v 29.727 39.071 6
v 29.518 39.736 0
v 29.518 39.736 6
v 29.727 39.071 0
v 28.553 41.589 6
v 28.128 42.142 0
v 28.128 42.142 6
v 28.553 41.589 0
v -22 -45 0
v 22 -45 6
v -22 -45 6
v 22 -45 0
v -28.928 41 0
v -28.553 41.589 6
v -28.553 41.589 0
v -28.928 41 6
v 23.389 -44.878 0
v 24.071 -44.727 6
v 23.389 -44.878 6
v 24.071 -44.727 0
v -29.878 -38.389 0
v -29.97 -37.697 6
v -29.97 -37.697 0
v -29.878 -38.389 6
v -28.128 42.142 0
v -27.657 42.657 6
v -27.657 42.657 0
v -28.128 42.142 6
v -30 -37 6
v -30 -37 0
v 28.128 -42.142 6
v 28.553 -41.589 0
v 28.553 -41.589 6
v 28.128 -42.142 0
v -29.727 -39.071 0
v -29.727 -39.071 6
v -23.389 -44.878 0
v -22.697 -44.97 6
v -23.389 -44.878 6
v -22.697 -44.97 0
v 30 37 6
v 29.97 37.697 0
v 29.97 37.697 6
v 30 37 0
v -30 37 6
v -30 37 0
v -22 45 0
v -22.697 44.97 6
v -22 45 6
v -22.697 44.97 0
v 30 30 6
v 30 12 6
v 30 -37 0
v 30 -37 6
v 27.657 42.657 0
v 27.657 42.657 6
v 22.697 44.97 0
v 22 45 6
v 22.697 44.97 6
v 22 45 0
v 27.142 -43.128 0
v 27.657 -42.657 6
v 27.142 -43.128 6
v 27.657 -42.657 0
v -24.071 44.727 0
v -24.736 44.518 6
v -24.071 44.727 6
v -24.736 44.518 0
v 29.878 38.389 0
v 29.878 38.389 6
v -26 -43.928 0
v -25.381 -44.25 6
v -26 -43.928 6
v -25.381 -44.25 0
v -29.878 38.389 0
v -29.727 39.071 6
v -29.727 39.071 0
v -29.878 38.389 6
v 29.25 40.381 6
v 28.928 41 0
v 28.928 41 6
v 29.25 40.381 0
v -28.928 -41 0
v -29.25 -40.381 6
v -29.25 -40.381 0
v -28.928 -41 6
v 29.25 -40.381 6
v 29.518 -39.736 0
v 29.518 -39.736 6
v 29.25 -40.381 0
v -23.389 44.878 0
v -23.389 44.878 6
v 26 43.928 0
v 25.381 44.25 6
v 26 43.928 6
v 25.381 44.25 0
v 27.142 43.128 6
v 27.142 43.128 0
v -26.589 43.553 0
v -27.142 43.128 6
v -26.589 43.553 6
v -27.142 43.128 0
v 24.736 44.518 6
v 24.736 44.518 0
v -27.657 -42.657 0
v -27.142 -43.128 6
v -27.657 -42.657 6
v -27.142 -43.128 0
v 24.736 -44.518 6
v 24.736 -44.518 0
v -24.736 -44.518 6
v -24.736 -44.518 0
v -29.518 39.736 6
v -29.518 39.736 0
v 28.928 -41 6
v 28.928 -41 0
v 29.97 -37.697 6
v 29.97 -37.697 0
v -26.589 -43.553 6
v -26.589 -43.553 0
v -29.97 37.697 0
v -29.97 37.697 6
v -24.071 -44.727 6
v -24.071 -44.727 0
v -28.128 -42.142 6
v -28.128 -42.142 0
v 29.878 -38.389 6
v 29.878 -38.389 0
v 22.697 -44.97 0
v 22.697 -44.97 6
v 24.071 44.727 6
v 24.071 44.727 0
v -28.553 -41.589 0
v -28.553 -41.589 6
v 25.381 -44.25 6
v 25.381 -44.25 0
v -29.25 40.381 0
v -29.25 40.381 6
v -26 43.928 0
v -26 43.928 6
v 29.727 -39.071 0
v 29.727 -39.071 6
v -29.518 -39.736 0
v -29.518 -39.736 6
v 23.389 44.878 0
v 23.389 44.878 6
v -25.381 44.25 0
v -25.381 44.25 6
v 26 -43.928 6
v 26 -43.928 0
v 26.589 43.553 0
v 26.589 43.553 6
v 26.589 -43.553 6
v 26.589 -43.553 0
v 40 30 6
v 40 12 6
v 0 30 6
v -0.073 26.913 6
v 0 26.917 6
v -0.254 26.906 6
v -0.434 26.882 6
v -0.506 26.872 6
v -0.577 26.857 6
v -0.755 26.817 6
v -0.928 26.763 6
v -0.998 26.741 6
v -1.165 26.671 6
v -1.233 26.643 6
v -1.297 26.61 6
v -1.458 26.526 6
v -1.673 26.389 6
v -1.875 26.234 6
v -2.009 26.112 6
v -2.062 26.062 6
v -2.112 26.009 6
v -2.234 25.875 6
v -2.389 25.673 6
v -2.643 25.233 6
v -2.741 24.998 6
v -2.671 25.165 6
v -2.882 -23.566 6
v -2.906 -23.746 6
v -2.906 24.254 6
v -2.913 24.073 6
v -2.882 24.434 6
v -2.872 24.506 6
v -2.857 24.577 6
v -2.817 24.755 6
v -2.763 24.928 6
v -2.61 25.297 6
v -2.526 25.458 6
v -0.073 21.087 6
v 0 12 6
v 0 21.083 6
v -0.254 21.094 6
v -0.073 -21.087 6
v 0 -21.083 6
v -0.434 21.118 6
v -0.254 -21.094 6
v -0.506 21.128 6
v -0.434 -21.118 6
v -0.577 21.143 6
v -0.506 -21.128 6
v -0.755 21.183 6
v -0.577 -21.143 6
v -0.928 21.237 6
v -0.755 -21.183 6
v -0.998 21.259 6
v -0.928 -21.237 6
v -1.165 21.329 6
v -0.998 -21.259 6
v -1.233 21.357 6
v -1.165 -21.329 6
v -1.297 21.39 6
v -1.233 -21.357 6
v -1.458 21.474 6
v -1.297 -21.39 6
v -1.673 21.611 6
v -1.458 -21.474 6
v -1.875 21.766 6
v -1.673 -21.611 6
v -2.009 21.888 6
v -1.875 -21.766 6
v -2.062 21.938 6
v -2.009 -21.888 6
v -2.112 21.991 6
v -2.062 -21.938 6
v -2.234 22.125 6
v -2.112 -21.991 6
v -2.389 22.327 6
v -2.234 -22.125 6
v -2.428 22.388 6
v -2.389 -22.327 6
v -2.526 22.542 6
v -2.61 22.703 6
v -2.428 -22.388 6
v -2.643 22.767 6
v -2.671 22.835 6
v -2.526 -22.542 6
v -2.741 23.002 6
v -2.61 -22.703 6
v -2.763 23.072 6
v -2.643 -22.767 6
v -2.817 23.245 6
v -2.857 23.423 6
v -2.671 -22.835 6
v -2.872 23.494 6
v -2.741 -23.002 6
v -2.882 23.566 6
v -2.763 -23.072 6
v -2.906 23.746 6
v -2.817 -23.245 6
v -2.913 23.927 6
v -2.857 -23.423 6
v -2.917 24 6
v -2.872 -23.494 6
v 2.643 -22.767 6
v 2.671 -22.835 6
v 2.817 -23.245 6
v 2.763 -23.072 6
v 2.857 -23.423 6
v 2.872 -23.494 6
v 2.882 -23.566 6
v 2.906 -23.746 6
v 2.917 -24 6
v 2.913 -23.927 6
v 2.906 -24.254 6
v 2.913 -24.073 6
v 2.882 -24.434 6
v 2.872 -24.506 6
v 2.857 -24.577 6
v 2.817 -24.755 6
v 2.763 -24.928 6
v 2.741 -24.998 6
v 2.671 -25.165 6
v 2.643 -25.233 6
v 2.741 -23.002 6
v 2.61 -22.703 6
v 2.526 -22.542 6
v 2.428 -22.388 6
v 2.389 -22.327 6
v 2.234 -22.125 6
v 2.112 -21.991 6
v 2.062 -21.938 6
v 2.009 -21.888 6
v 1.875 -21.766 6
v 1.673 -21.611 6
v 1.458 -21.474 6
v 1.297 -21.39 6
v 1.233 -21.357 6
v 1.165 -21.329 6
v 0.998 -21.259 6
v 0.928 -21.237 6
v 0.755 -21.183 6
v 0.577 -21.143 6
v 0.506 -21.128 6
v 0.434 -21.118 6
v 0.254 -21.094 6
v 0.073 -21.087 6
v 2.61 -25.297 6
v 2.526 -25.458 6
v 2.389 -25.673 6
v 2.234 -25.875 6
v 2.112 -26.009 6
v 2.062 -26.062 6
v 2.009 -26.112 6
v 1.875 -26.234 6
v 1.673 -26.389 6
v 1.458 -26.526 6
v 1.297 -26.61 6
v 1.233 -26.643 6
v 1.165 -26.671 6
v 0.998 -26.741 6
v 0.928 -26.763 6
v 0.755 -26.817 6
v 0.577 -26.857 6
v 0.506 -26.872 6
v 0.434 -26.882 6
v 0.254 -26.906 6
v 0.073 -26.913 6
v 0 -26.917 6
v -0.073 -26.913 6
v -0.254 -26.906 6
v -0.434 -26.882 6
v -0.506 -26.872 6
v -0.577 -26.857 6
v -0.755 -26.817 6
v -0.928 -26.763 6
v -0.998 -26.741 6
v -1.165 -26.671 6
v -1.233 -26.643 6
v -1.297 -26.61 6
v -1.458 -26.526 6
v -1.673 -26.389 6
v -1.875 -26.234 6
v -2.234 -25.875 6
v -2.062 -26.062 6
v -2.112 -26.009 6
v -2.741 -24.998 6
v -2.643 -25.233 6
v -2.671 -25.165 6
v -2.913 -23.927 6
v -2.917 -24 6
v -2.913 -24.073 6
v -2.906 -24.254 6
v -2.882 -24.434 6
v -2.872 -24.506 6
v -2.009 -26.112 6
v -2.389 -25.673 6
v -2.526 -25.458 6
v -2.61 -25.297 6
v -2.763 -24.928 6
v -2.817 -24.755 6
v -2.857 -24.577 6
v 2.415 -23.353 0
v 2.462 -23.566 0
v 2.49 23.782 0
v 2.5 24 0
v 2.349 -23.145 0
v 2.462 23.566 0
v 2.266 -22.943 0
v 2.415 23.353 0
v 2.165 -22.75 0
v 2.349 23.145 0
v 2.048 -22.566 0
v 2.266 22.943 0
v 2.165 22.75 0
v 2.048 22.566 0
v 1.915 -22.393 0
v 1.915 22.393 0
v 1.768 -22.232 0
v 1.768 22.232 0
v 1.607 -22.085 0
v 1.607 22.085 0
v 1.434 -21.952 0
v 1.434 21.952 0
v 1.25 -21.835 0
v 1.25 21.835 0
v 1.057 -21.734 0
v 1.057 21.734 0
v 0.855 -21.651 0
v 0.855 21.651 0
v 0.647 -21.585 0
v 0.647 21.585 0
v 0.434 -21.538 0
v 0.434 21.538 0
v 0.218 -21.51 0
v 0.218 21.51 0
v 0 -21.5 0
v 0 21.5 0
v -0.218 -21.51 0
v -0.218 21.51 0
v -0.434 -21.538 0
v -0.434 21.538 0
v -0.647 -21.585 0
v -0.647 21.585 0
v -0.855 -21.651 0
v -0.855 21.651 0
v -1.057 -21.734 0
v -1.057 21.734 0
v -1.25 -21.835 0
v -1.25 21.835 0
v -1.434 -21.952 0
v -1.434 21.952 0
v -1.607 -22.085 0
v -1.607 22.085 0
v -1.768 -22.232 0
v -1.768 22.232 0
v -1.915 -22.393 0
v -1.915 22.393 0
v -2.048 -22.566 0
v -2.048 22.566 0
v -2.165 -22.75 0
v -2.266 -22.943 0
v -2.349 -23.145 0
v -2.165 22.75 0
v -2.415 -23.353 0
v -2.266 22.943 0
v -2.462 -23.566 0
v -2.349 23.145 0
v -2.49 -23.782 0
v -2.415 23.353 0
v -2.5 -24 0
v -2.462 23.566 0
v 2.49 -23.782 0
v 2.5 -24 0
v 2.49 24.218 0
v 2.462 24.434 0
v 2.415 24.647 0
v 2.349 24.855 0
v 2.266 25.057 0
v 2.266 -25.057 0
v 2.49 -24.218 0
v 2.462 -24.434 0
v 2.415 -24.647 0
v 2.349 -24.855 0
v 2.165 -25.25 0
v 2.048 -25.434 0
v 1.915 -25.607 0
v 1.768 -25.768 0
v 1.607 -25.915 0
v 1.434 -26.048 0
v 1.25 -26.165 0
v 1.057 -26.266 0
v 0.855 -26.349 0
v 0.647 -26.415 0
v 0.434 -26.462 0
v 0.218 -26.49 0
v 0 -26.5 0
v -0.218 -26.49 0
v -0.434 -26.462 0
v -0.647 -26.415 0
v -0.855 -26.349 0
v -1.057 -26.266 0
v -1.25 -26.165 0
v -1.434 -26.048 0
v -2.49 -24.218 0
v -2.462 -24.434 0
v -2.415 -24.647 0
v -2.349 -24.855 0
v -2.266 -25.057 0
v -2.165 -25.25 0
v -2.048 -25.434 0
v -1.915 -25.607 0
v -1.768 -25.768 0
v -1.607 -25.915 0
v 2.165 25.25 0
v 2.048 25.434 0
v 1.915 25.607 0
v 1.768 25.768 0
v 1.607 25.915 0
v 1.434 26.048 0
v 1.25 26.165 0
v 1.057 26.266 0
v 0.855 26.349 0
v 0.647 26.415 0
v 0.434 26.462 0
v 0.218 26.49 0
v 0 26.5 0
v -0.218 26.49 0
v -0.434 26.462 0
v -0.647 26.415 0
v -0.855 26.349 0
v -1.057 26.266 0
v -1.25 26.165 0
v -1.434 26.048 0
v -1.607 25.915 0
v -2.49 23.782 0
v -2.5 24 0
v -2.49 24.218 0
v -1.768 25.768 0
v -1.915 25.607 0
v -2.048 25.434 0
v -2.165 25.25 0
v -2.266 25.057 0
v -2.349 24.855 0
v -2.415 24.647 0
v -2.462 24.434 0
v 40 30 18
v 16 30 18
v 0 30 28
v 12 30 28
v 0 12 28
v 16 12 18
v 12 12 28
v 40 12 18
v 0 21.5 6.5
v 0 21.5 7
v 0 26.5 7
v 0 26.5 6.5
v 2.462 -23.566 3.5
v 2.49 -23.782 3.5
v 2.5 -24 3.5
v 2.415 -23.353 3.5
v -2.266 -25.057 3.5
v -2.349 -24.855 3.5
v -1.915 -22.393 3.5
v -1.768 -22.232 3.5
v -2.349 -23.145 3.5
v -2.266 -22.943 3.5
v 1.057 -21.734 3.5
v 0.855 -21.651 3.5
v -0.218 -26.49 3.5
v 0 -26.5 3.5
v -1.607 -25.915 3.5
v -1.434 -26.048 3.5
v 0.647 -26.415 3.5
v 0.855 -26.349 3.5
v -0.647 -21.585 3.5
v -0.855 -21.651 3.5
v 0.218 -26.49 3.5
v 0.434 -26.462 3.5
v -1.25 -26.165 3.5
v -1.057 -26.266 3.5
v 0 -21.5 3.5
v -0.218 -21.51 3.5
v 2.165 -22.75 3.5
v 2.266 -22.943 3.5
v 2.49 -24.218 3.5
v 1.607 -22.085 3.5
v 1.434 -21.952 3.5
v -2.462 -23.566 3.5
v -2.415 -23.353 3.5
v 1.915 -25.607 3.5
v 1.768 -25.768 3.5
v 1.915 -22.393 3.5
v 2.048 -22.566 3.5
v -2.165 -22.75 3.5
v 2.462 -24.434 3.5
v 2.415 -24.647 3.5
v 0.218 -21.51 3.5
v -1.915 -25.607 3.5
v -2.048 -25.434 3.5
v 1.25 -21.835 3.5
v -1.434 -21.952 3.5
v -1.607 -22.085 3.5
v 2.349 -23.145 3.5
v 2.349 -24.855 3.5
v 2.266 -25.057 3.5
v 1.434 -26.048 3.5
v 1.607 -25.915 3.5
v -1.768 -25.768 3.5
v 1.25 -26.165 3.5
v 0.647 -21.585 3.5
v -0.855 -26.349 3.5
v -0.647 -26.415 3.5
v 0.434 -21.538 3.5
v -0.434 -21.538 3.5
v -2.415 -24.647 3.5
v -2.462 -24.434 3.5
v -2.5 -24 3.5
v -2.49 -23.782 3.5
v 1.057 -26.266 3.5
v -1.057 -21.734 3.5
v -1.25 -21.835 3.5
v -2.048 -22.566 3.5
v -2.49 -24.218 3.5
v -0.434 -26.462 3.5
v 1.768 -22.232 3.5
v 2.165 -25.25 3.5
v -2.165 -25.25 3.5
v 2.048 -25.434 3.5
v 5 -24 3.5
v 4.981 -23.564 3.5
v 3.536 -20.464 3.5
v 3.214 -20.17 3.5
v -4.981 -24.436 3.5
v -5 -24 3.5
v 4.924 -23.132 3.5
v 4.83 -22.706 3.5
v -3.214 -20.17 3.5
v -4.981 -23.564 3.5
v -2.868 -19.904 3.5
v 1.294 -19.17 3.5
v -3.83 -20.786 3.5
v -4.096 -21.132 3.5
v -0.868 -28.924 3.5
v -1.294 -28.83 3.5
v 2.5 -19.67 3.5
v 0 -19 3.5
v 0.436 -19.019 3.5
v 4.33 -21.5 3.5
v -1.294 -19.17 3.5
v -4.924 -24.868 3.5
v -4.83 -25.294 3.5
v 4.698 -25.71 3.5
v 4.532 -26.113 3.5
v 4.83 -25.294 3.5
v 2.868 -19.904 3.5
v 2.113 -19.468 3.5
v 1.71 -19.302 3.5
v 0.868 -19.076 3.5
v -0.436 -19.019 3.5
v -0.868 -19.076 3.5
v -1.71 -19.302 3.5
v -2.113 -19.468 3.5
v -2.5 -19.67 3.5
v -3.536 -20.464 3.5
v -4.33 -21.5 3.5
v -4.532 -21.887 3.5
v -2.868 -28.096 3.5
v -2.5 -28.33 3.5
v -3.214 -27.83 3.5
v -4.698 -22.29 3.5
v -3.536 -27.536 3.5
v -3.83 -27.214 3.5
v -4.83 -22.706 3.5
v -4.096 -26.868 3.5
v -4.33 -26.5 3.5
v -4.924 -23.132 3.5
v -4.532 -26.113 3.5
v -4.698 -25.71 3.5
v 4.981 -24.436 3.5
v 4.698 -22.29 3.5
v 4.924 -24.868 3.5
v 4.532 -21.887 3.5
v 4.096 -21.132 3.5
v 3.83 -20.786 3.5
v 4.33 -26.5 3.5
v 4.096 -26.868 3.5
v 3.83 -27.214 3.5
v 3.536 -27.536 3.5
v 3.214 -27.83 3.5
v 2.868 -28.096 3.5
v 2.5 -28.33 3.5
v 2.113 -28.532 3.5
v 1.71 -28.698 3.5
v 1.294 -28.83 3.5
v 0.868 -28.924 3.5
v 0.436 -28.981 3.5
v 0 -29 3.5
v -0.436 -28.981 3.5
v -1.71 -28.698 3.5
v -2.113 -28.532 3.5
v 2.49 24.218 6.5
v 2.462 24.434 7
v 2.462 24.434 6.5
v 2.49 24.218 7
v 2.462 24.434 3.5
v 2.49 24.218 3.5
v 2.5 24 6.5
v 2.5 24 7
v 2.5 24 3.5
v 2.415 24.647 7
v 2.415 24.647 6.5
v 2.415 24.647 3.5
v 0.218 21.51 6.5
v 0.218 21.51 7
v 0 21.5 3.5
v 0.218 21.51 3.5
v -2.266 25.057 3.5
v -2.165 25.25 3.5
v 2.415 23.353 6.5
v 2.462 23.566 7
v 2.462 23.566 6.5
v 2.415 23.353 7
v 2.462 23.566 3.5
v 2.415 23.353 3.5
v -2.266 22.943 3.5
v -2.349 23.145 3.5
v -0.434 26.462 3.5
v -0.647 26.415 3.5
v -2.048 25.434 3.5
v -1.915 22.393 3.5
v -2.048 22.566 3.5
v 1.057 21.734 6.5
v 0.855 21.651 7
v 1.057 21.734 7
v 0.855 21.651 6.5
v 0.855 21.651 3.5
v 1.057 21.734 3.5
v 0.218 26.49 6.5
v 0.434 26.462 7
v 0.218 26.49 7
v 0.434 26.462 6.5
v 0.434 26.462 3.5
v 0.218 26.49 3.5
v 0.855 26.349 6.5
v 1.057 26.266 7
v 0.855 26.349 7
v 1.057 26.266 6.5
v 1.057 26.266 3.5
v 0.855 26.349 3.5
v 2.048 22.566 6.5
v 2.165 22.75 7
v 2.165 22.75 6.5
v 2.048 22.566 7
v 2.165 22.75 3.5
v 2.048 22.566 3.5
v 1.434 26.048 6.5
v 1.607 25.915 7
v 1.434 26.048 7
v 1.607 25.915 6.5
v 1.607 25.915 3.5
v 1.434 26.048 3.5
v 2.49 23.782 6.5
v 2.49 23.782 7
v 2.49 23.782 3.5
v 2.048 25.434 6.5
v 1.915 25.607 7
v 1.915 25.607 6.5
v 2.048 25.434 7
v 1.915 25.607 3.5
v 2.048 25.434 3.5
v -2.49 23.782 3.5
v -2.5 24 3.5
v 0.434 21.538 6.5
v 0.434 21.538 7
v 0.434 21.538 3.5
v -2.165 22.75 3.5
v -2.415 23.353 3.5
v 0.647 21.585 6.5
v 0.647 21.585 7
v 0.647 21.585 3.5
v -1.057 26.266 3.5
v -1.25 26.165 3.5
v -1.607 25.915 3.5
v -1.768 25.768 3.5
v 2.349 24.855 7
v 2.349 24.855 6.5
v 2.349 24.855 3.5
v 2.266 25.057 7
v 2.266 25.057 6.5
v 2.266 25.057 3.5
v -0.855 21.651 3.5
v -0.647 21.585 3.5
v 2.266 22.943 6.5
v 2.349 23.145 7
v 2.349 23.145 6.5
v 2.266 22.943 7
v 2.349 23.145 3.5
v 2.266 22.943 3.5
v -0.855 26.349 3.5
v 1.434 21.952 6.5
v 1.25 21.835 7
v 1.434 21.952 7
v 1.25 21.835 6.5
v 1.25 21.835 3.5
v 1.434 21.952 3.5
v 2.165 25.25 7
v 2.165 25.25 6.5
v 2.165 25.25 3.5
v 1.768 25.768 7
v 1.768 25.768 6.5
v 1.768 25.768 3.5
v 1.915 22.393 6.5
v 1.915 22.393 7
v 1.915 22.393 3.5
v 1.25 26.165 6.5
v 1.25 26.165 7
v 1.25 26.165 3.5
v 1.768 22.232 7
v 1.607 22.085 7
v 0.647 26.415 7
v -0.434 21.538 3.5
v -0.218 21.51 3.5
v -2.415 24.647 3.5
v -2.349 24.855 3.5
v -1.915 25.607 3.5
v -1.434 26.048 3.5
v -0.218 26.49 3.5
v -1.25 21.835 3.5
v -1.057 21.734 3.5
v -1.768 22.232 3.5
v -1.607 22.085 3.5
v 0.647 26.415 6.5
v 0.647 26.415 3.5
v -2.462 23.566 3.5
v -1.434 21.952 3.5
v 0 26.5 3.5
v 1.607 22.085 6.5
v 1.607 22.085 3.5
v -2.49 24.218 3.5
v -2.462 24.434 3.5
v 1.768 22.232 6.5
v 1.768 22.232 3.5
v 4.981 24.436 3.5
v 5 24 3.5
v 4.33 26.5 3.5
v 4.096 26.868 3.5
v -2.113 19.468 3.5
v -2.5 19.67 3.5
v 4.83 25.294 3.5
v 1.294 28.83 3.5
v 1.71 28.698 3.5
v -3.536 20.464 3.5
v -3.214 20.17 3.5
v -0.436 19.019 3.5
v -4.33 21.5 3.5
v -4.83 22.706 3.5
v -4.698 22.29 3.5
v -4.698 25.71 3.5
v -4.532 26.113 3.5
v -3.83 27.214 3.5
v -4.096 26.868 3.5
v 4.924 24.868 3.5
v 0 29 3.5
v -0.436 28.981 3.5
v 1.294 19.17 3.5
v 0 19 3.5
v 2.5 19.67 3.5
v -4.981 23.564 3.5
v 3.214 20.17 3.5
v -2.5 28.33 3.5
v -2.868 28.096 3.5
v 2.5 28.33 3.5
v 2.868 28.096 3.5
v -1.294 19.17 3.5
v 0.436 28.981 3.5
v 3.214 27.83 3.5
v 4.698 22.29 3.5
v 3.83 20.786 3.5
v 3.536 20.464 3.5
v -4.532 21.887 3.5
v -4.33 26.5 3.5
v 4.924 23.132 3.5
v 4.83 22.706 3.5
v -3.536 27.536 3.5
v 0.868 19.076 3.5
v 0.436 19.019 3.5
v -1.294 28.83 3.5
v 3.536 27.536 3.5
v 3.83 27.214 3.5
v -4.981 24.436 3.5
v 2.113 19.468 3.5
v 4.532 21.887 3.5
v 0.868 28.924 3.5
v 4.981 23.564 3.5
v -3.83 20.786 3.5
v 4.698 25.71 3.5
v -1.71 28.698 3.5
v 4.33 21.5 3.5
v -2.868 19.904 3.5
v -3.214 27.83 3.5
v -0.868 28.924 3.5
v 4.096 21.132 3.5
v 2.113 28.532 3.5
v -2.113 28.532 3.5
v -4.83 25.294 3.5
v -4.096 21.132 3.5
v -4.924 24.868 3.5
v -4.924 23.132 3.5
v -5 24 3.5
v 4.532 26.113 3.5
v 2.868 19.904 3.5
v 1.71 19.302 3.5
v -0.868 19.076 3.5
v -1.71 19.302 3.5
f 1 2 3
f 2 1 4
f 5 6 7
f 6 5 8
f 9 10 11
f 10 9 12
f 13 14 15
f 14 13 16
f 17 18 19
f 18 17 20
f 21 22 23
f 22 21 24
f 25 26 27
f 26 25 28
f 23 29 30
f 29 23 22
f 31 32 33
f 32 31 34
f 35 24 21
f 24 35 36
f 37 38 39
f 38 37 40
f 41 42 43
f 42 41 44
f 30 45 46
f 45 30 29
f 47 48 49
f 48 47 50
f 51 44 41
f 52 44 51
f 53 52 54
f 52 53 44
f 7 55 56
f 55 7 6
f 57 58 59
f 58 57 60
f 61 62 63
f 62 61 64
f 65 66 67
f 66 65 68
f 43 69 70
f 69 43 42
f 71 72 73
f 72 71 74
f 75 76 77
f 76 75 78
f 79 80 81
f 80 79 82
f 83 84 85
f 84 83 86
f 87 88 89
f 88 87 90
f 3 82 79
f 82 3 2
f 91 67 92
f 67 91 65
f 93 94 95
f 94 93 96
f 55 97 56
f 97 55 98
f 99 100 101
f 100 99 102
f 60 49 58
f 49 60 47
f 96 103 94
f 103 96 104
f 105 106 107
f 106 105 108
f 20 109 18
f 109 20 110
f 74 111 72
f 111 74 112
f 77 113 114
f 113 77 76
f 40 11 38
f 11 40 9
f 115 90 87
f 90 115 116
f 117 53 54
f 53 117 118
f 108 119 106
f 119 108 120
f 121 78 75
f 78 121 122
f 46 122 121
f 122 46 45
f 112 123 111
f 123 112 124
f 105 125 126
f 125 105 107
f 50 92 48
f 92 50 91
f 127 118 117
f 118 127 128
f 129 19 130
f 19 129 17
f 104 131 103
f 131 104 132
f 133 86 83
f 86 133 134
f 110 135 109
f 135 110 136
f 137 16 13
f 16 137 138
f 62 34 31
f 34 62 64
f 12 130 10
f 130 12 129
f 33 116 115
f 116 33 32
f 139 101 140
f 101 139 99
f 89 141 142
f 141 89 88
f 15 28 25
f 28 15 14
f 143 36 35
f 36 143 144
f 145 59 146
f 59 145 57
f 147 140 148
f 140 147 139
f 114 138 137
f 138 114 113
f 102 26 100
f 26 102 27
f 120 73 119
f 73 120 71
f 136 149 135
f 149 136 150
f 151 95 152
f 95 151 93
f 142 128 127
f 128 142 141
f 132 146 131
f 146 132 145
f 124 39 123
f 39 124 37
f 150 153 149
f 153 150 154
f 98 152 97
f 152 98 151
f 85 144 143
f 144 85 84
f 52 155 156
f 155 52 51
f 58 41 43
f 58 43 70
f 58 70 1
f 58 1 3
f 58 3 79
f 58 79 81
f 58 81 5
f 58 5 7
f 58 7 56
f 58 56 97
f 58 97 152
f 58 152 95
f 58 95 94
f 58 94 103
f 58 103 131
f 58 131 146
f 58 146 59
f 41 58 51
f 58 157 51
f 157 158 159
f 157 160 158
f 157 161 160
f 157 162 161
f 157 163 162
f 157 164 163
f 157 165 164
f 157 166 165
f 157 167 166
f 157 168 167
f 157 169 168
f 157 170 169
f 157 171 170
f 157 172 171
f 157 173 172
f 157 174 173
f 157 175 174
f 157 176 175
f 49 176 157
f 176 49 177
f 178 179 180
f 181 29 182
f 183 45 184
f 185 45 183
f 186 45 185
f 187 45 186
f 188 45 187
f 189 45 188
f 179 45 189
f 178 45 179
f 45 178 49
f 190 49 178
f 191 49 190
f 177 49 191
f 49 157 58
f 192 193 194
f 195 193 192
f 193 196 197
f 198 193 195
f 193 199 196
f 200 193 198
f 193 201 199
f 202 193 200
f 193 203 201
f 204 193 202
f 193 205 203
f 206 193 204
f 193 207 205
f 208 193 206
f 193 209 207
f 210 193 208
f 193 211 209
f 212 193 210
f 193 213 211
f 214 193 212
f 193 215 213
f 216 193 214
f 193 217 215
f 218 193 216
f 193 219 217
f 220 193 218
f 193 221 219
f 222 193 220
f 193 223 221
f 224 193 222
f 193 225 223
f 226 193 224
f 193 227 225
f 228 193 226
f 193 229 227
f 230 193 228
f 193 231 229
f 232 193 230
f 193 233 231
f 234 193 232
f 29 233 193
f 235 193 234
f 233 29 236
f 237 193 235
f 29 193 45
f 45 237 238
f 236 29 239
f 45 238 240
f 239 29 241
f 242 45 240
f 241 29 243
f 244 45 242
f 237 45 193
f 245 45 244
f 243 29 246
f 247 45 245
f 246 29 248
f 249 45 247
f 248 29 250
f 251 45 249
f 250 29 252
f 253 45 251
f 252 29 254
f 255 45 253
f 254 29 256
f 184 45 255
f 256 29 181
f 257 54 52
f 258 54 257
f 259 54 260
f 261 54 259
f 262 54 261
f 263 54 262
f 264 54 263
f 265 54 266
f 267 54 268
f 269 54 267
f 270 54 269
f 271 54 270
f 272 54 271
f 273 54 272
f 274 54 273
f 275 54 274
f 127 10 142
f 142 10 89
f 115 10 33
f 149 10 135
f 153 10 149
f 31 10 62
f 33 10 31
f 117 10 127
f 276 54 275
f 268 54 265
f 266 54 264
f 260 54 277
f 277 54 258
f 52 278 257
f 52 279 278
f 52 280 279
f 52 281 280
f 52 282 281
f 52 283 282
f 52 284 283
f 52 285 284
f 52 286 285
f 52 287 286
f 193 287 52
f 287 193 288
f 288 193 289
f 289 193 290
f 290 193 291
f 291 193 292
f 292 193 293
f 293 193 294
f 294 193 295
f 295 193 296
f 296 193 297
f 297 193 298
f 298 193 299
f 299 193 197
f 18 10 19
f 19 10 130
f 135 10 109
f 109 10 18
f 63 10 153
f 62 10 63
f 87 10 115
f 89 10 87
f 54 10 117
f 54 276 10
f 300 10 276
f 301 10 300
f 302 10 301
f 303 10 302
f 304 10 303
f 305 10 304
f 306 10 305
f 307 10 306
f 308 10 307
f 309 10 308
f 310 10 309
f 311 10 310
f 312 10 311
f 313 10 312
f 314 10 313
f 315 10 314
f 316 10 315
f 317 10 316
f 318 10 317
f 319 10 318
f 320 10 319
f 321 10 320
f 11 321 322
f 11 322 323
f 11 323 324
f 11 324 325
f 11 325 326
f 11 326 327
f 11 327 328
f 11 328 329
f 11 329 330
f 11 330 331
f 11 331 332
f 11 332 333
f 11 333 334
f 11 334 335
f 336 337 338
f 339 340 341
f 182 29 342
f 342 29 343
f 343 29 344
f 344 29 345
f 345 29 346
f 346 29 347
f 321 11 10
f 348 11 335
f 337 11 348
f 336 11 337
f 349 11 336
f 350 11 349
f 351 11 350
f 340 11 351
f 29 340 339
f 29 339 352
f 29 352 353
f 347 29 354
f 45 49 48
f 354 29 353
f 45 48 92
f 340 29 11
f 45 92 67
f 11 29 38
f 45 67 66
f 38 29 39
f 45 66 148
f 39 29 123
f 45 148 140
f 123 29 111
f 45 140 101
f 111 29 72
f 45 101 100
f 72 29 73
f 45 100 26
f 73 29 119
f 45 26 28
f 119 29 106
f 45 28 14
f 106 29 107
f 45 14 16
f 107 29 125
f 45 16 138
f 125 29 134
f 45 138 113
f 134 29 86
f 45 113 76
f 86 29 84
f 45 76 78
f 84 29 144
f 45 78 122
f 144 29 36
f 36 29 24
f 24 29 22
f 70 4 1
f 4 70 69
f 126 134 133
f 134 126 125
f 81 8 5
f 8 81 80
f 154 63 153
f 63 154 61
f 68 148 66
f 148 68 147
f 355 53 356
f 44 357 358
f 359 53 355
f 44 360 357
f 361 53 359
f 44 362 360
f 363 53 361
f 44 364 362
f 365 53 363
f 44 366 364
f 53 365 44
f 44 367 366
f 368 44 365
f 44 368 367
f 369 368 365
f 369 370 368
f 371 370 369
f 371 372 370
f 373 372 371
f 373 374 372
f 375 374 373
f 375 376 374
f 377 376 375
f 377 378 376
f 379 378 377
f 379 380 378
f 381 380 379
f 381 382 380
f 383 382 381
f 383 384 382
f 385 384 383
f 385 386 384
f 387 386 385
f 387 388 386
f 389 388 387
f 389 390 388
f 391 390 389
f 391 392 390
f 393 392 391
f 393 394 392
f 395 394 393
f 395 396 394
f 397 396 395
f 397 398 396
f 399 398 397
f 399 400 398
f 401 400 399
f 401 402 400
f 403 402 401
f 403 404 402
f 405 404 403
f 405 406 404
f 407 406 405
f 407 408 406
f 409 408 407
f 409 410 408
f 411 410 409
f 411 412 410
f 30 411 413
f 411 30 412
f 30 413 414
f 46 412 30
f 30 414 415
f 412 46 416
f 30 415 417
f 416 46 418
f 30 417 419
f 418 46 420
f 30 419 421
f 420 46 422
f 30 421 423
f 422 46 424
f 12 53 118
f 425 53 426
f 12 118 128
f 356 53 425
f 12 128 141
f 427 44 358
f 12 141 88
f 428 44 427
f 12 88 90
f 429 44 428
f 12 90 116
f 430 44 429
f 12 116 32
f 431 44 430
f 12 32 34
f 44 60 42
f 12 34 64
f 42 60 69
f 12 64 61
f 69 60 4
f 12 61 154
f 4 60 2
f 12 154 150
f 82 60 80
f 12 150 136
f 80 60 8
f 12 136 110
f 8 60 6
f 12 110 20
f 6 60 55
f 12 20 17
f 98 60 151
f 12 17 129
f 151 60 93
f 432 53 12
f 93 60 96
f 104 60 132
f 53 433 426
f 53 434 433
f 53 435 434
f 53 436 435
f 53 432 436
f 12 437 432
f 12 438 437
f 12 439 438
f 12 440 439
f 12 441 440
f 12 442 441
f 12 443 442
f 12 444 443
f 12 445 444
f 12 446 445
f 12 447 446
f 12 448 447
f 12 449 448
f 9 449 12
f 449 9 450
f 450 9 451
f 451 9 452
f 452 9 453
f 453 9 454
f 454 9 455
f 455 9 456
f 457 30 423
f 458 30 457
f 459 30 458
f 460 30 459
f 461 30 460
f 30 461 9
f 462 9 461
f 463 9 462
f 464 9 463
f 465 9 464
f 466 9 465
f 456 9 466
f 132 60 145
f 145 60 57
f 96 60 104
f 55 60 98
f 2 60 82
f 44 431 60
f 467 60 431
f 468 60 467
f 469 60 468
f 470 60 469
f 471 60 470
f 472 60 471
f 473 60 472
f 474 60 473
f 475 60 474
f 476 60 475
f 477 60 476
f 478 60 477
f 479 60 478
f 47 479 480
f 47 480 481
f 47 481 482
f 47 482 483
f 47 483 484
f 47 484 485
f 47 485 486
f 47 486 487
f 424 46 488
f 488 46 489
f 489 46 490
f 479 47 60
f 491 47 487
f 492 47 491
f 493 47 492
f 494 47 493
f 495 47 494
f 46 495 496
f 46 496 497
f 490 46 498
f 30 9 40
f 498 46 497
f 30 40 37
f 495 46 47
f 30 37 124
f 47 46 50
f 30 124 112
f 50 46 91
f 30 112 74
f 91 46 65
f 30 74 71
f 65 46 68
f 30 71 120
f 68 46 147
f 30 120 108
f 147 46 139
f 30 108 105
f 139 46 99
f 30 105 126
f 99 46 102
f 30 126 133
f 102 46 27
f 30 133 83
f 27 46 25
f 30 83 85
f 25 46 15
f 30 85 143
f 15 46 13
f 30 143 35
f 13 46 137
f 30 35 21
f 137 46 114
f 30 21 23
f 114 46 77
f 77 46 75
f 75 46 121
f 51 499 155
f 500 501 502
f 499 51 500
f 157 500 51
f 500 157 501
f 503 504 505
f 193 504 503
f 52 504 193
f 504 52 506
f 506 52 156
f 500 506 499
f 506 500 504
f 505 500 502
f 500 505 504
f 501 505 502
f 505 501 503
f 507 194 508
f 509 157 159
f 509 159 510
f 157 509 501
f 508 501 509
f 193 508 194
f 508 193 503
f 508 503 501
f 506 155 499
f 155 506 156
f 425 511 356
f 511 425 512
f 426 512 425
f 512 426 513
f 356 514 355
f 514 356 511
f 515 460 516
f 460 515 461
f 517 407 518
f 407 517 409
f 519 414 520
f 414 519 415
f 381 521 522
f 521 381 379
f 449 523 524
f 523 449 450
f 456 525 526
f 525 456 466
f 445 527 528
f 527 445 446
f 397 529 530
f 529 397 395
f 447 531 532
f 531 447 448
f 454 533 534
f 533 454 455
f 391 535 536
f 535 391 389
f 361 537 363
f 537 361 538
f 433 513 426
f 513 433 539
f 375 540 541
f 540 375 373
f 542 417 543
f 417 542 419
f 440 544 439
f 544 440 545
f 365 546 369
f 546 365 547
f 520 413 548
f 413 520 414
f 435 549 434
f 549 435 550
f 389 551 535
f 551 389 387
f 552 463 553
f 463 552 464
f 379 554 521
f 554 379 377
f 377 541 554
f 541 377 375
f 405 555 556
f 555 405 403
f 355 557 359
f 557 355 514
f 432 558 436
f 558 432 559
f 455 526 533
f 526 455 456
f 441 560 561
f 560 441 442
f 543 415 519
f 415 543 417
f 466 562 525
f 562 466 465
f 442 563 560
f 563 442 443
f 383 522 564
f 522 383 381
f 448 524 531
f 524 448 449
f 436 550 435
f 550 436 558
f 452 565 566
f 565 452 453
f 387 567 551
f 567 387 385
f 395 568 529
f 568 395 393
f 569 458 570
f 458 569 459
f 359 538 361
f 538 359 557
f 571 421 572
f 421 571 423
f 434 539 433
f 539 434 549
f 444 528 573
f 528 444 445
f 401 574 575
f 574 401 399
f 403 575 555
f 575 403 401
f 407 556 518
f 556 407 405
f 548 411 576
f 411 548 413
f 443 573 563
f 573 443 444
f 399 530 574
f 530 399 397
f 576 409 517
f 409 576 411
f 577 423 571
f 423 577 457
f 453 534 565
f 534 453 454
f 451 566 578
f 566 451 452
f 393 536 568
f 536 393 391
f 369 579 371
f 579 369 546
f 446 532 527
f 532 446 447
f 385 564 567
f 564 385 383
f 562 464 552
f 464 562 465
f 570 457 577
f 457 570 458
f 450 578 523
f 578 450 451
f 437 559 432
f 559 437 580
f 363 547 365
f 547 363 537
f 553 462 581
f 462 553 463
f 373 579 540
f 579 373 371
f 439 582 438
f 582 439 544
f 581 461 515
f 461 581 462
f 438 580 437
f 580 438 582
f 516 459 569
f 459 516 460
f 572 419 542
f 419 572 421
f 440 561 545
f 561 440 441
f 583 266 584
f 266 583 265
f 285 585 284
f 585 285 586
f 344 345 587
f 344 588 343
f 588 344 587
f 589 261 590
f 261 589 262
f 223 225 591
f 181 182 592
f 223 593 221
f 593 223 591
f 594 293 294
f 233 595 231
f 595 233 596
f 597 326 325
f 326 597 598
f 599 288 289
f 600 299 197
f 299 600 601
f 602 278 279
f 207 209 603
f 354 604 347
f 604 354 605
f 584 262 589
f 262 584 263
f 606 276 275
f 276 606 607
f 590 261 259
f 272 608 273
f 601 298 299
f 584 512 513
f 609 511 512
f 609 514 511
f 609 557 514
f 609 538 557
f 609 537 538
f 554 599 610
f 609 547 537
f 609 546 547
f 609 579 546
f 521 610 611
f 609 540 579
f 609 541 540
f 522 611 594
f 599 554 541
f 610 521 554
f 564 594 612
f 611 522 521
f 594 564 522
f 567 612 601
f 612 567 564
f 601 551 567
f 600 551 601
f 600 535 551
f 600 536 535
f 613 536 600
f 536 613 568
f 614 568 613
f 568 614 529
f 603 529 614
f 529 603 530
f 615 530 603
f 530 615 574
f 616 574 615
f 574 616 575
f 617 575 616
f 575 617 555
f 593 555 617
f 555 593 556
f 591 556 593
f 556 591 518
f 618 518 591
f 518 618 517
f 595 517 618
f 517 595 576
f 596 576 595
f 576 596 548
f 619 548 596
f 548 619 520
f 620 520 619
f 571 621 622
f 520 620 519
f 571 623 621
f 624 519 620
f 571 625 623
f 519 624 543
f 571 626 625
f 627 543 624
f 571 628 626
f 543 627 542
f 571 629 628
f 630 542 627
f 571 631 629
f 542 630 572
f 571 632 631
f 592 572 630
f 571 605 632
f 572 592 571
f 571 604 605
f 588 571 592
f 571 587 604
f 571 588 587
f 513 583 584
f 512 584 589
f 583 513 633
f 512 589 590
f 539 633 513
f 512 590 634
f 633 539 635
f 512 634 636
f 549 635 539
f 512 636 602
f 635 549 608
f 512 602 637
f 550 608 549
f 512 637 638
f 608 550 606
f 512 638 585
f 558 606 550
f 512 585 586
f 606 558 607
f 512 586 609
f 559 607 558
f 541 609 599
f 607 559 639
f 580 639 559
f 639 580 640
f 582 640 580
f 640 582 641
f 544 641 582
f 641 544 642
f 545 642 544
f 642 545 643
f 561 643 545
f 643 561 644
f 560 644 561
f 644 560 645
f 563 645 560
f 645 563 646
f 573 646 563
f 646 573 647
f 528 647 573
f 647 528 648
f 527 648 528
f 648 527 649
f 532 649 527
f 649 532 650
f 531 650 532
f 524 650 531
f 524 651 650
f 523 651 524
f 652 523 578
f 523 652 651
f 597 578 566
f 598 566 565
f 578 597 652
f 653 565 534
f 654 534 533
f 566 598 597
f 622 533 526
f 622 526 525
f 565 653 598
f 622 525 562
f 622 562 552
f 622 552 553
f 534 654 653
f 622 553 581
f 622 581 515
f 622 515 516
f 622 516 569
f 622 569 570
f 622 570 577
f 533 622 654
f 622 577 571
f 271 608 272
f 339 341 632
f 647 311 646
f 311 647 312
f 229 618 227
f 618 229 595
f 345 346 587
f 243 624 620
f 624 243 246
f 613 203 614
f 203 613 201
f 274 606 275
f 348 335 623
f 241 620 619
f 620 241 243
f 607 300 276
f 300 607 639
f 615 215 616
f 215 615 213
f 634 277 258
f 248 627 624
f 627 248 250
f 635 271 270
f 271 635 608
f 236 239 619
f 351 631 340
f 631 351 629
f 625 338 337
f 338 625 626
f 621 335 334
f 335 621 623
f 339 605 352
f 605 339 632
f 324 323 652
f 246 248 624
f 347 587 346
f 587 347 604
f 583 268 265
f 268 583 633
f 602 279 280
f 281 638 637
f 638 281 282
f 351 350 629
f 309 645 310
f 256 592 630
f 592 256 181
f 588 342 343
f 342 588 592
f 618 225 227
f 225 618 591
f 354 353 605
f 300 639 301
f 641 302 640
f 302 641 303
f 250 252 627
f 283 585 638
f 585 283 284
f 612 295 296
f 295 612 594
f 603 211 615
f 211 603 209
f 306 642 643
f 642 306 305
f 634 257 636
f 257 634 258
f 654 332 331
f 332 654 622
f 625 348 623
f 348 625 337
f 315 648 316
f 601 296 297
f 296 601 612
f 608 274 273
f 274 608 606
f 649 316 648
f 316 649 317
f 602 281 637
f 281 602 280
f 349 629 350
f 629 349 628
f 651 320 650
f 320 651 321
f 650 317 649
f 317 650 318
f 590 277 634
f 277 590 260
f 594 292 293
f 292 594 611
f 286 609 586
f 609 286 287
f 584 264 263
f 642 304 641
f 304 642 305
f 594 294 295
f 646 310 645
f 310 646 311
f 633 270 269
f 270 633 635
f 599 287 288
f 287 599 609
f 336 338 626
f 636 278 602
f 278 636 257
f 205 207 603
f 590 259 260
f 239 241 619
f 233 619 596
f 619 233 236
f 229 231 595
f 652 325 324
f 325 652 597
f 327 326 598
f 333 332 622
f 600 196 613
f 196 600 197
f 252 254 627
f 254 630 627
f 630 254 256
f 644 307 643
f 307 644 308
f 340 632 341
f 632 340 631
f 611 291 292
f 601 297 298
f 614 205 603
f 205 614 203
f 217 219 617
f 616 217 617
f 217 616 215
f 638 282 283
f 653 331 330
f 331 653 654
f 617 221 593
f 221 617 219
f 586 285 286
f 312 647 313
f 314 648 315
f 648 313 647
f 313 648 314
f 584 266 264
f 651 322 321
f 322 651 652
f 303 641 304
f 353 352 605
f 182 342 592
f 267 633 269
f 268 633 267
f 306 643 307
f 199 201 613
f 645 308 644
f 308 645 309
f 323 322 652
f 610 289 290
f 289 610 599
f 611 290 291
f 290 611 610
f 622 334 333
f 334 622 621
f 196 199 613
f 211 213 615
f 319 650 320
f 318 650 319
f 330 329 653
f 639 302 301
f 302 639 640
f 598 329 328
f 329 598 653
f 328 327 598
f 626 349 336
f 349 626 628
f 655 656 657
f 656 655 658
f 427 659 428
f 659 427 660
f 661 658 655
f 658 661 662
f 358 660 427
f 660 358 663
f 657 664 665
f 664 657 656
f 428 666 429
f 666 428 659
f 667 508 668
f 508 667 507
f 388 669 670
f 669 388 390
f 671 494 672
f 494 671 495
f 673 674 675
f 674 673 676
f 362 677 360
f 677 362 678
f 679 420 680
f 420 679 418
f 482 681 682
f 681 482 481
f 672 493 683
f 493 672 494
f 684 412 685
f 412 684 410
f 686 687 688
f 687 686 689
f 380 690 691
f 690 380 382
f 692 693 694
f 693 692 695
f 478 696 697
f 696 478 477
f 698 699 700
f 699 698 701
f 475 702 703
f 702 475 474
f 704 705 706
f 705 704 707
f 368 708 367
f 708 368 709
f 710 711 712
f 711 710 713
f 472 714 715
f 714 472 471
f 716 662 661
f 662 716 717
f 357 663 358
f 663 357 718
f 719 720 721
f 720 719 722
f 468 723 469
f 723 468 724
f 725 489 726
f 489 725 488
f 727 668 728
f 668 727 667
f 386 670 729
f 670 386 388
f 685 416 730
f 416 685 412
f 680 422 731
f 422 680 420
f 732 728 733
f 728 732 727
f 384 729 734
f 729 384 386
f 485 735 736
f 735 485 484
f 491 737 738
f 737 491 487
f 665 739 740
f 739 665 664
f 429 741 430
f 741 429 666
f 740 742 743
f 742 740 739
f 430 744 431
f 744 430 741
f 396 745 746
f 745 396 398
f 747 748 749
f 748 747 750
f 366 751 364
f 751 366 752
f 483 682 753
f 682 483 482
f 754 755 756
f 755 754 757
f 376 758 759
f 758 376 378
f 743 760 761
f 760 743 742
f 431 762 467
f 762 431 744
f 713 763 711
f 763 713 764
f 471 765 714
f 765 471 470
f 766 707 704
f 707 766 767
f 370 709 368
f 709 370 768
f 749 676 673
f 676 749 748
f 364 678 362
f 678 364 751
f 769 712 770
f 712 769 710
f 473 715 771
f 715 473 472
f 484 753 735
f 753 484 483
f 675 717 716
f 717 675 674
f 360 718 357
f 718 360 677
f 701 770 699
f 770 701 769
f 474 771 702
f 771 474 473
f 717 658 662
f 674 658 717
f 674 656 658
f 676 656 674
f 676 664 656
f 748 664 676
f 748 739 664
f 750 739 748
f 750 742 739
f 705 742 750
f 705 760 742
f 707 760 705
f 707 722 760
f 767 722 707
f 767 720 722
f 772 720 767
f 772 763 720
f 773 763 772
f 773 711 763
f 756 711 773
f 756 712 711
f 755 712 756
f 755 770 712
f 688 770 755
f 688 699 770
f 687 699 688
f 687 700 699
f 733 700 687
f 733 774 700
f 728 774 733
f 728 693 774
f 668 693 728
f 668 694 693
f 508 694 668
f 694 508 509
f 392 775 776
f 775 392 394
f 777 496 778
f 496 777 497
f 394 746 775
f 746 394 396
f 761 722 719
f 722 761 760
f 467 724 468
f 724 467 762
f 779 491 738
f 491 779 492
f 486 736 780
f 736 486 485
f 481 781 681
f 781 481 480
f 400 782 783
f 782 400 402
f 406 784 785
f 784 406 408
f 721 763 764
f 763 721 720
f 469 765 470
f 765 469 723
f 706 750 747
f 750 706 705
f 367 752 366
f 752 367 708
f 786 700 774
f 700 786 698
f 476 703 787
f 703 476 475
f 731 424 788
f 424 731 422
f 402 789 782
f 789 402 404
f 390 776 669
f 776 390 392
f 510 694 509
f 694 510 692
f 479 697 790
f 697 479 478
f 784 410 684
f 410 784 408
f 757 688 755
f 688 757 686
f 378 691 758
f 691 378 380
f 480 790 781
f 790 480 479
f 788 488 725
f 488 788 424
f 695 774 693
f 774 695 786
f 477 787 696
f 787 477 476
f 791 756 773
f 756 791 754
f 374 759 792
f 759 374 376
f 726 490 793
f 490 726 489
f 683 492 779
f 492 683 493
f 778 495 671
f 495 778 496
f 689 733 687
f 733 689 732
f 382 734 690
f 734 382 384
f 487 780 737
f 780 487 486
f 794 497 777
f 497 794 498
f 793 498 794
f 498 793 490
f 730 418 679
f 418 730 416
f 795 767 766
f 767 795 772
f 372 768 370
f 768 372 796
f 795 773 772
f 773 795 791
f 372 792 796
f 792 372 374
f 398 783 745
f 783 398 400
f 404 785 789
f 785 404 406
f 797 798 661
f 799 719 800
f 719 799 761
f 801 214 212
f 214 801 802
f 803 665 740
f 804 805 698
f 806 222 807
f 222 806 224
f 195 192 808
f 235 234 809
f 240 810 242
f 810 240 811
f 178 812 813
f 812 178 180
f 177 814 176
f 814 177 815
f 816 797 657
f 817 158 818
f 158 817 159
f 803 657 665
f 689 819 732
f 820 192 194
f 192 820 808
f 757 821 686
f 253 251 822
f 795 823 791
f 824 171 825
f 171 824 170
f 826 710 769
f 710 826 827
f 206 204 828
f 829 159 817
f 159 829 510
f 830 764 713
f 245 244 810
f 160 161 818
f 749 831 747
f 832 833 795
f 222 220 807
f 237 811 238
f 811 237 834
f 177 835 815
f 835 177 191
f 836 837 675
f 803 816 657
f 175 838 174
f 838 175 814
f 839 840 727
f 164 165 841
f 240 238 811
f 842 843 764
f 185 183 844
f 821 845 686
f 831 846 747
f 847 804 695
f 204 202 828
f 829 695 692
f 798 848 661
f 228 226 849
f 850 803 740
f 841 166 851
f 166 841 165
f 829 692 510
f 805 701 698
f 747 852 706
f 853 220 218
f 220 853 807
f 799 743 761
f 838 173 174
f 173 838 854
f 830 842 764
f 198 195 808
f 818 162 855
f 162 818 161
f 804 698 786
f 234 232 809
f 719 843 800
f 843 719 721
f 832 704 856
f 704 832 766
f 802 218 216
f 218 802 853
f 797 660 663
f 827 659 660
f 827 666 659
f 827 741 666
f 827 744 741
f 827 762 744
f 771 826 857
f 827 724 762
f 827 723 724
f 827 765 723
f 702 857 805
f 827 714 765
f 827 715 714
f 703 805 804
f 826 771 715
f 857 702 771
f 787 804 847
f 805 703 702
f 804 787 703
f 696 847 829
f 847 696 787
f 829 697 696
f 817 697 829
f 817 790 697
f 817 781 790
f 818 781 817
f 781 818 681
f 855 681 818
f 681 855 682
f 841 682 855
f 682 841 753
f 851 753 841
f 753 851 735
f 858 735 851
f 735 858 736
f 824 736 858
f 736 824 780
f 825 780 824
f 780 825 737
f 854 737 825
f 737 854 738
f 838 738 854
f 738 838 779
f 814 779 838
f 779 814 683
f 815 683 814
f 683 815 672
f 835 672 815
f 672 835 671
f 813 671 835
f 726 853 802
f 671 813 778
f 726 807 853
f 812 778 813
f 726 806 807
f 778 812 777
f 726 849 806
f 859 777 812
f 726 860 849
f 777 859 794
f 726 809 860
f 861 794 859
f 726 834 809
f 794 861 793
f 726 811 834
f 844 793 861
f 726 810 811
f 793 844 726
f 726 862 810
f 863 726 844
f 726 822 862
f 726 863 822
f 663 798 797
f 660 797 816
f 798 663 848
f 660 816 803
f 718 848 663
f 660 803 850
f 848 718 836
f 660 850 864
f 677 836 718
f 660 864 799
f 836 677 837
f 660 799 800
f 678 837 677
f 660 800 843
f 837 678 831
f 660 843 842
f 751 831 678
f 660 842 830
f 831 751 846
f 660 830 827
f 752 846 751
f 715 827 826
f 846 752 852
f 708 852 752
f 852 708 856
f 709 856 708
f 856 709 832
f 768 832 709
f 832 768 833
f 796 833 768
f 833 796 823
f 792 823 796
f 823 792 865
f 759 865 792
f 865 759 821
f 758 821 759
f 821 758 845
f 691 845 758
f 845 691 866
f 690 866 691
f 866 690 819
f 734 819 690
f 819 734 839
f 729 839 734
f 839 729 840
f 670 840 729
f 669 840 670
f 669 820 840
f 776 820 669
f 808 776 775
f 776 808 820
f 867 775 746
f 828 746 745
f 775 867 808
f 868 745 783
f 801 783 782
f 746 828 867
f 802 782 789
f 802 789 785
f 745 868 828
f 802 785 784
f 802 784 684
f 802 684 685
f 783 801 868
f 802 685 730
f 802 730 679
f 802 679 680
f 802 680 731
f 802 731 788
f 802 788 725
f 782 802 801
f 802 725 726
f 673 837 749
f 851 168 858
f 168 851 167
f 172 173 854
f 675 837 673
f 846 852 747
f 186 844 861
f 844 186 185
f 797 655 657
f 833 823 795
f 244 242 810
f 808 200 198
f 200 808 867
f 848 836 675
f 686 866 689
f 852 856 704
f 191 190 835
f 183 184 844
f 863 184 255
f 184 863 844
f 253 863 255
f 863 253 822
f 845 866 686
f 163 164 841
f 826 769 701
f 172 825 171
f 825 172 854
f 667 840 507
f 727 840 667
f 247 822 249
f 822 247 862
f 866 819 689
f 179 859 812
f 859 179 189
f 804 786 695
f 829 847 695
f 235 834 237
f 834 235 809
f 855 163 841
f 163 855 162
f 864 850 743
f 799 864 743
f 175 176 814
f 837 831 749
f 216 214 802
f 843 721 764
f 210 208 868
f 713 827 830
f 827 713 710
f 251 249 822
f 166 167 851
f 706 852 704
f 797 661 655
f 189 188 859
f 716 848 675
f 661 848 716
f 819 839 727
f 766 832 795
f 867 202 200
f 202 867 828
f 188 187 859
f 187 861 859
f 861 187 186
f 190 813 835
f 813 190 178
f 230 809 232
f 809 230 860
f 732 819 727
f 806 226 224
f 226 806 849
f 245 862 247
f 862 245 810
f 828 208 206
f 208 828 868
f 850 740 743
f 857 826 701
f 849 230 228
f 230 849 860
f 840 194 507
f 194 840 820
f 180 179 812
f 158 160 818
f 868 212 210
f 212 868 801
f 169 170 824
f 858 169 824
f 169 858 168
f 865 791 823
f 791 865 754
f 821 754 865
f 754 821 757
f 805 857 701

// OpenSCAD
// TS-PET-006 - Wall Leash Hook
$fn = 72;
plate_w = 60; plate_h = 90; plate_t = 6; corner_r = 8;
hook_proj = 40; hook_w = 18; hook_t = 12; hook_lip = 10;
screw_d = 5; head_d = 10; hole_y = 24;
module rounded_plate_2d(w, h, r) { hull() { translate([-w/2 + r, -h/2 + r]) circle(r = r); translate([ w/2 - r, -h/2 + r]) circle(r = r); translate([-w/2 + r,  h/2 - r]) circle(r = r); translate([ w/2 - r,  h/2 - r]) circle(r = r);} }
module plate() { linear_extrude(height = plate_t) rounded_plate_2d(plate_w, plate_h, corner_r); }
module hook_profile() { polygon(points = [[0,0],[hook_proj,0],[hook_proj,hook_t],[16,hook_t],[12,hook_t + hook_lip],[0,hook_t + hook_lip]]); }
difference() { union() { plate(); translate([0, plate_h/2 - 24, plate_t]) rotate([90,0,0]) linear_extrude(height = hook_w, center = true) hook_profile(); }
for (y = [-hole_y, hole_y]) { translate([0,y,-1]) cylinder(h = plate_t + 2, d = screw_d); translate([0,y,plate_t - 2.5]) cylinder(h = 3.0, d1 = head_d, d2 = screw_d); } }
